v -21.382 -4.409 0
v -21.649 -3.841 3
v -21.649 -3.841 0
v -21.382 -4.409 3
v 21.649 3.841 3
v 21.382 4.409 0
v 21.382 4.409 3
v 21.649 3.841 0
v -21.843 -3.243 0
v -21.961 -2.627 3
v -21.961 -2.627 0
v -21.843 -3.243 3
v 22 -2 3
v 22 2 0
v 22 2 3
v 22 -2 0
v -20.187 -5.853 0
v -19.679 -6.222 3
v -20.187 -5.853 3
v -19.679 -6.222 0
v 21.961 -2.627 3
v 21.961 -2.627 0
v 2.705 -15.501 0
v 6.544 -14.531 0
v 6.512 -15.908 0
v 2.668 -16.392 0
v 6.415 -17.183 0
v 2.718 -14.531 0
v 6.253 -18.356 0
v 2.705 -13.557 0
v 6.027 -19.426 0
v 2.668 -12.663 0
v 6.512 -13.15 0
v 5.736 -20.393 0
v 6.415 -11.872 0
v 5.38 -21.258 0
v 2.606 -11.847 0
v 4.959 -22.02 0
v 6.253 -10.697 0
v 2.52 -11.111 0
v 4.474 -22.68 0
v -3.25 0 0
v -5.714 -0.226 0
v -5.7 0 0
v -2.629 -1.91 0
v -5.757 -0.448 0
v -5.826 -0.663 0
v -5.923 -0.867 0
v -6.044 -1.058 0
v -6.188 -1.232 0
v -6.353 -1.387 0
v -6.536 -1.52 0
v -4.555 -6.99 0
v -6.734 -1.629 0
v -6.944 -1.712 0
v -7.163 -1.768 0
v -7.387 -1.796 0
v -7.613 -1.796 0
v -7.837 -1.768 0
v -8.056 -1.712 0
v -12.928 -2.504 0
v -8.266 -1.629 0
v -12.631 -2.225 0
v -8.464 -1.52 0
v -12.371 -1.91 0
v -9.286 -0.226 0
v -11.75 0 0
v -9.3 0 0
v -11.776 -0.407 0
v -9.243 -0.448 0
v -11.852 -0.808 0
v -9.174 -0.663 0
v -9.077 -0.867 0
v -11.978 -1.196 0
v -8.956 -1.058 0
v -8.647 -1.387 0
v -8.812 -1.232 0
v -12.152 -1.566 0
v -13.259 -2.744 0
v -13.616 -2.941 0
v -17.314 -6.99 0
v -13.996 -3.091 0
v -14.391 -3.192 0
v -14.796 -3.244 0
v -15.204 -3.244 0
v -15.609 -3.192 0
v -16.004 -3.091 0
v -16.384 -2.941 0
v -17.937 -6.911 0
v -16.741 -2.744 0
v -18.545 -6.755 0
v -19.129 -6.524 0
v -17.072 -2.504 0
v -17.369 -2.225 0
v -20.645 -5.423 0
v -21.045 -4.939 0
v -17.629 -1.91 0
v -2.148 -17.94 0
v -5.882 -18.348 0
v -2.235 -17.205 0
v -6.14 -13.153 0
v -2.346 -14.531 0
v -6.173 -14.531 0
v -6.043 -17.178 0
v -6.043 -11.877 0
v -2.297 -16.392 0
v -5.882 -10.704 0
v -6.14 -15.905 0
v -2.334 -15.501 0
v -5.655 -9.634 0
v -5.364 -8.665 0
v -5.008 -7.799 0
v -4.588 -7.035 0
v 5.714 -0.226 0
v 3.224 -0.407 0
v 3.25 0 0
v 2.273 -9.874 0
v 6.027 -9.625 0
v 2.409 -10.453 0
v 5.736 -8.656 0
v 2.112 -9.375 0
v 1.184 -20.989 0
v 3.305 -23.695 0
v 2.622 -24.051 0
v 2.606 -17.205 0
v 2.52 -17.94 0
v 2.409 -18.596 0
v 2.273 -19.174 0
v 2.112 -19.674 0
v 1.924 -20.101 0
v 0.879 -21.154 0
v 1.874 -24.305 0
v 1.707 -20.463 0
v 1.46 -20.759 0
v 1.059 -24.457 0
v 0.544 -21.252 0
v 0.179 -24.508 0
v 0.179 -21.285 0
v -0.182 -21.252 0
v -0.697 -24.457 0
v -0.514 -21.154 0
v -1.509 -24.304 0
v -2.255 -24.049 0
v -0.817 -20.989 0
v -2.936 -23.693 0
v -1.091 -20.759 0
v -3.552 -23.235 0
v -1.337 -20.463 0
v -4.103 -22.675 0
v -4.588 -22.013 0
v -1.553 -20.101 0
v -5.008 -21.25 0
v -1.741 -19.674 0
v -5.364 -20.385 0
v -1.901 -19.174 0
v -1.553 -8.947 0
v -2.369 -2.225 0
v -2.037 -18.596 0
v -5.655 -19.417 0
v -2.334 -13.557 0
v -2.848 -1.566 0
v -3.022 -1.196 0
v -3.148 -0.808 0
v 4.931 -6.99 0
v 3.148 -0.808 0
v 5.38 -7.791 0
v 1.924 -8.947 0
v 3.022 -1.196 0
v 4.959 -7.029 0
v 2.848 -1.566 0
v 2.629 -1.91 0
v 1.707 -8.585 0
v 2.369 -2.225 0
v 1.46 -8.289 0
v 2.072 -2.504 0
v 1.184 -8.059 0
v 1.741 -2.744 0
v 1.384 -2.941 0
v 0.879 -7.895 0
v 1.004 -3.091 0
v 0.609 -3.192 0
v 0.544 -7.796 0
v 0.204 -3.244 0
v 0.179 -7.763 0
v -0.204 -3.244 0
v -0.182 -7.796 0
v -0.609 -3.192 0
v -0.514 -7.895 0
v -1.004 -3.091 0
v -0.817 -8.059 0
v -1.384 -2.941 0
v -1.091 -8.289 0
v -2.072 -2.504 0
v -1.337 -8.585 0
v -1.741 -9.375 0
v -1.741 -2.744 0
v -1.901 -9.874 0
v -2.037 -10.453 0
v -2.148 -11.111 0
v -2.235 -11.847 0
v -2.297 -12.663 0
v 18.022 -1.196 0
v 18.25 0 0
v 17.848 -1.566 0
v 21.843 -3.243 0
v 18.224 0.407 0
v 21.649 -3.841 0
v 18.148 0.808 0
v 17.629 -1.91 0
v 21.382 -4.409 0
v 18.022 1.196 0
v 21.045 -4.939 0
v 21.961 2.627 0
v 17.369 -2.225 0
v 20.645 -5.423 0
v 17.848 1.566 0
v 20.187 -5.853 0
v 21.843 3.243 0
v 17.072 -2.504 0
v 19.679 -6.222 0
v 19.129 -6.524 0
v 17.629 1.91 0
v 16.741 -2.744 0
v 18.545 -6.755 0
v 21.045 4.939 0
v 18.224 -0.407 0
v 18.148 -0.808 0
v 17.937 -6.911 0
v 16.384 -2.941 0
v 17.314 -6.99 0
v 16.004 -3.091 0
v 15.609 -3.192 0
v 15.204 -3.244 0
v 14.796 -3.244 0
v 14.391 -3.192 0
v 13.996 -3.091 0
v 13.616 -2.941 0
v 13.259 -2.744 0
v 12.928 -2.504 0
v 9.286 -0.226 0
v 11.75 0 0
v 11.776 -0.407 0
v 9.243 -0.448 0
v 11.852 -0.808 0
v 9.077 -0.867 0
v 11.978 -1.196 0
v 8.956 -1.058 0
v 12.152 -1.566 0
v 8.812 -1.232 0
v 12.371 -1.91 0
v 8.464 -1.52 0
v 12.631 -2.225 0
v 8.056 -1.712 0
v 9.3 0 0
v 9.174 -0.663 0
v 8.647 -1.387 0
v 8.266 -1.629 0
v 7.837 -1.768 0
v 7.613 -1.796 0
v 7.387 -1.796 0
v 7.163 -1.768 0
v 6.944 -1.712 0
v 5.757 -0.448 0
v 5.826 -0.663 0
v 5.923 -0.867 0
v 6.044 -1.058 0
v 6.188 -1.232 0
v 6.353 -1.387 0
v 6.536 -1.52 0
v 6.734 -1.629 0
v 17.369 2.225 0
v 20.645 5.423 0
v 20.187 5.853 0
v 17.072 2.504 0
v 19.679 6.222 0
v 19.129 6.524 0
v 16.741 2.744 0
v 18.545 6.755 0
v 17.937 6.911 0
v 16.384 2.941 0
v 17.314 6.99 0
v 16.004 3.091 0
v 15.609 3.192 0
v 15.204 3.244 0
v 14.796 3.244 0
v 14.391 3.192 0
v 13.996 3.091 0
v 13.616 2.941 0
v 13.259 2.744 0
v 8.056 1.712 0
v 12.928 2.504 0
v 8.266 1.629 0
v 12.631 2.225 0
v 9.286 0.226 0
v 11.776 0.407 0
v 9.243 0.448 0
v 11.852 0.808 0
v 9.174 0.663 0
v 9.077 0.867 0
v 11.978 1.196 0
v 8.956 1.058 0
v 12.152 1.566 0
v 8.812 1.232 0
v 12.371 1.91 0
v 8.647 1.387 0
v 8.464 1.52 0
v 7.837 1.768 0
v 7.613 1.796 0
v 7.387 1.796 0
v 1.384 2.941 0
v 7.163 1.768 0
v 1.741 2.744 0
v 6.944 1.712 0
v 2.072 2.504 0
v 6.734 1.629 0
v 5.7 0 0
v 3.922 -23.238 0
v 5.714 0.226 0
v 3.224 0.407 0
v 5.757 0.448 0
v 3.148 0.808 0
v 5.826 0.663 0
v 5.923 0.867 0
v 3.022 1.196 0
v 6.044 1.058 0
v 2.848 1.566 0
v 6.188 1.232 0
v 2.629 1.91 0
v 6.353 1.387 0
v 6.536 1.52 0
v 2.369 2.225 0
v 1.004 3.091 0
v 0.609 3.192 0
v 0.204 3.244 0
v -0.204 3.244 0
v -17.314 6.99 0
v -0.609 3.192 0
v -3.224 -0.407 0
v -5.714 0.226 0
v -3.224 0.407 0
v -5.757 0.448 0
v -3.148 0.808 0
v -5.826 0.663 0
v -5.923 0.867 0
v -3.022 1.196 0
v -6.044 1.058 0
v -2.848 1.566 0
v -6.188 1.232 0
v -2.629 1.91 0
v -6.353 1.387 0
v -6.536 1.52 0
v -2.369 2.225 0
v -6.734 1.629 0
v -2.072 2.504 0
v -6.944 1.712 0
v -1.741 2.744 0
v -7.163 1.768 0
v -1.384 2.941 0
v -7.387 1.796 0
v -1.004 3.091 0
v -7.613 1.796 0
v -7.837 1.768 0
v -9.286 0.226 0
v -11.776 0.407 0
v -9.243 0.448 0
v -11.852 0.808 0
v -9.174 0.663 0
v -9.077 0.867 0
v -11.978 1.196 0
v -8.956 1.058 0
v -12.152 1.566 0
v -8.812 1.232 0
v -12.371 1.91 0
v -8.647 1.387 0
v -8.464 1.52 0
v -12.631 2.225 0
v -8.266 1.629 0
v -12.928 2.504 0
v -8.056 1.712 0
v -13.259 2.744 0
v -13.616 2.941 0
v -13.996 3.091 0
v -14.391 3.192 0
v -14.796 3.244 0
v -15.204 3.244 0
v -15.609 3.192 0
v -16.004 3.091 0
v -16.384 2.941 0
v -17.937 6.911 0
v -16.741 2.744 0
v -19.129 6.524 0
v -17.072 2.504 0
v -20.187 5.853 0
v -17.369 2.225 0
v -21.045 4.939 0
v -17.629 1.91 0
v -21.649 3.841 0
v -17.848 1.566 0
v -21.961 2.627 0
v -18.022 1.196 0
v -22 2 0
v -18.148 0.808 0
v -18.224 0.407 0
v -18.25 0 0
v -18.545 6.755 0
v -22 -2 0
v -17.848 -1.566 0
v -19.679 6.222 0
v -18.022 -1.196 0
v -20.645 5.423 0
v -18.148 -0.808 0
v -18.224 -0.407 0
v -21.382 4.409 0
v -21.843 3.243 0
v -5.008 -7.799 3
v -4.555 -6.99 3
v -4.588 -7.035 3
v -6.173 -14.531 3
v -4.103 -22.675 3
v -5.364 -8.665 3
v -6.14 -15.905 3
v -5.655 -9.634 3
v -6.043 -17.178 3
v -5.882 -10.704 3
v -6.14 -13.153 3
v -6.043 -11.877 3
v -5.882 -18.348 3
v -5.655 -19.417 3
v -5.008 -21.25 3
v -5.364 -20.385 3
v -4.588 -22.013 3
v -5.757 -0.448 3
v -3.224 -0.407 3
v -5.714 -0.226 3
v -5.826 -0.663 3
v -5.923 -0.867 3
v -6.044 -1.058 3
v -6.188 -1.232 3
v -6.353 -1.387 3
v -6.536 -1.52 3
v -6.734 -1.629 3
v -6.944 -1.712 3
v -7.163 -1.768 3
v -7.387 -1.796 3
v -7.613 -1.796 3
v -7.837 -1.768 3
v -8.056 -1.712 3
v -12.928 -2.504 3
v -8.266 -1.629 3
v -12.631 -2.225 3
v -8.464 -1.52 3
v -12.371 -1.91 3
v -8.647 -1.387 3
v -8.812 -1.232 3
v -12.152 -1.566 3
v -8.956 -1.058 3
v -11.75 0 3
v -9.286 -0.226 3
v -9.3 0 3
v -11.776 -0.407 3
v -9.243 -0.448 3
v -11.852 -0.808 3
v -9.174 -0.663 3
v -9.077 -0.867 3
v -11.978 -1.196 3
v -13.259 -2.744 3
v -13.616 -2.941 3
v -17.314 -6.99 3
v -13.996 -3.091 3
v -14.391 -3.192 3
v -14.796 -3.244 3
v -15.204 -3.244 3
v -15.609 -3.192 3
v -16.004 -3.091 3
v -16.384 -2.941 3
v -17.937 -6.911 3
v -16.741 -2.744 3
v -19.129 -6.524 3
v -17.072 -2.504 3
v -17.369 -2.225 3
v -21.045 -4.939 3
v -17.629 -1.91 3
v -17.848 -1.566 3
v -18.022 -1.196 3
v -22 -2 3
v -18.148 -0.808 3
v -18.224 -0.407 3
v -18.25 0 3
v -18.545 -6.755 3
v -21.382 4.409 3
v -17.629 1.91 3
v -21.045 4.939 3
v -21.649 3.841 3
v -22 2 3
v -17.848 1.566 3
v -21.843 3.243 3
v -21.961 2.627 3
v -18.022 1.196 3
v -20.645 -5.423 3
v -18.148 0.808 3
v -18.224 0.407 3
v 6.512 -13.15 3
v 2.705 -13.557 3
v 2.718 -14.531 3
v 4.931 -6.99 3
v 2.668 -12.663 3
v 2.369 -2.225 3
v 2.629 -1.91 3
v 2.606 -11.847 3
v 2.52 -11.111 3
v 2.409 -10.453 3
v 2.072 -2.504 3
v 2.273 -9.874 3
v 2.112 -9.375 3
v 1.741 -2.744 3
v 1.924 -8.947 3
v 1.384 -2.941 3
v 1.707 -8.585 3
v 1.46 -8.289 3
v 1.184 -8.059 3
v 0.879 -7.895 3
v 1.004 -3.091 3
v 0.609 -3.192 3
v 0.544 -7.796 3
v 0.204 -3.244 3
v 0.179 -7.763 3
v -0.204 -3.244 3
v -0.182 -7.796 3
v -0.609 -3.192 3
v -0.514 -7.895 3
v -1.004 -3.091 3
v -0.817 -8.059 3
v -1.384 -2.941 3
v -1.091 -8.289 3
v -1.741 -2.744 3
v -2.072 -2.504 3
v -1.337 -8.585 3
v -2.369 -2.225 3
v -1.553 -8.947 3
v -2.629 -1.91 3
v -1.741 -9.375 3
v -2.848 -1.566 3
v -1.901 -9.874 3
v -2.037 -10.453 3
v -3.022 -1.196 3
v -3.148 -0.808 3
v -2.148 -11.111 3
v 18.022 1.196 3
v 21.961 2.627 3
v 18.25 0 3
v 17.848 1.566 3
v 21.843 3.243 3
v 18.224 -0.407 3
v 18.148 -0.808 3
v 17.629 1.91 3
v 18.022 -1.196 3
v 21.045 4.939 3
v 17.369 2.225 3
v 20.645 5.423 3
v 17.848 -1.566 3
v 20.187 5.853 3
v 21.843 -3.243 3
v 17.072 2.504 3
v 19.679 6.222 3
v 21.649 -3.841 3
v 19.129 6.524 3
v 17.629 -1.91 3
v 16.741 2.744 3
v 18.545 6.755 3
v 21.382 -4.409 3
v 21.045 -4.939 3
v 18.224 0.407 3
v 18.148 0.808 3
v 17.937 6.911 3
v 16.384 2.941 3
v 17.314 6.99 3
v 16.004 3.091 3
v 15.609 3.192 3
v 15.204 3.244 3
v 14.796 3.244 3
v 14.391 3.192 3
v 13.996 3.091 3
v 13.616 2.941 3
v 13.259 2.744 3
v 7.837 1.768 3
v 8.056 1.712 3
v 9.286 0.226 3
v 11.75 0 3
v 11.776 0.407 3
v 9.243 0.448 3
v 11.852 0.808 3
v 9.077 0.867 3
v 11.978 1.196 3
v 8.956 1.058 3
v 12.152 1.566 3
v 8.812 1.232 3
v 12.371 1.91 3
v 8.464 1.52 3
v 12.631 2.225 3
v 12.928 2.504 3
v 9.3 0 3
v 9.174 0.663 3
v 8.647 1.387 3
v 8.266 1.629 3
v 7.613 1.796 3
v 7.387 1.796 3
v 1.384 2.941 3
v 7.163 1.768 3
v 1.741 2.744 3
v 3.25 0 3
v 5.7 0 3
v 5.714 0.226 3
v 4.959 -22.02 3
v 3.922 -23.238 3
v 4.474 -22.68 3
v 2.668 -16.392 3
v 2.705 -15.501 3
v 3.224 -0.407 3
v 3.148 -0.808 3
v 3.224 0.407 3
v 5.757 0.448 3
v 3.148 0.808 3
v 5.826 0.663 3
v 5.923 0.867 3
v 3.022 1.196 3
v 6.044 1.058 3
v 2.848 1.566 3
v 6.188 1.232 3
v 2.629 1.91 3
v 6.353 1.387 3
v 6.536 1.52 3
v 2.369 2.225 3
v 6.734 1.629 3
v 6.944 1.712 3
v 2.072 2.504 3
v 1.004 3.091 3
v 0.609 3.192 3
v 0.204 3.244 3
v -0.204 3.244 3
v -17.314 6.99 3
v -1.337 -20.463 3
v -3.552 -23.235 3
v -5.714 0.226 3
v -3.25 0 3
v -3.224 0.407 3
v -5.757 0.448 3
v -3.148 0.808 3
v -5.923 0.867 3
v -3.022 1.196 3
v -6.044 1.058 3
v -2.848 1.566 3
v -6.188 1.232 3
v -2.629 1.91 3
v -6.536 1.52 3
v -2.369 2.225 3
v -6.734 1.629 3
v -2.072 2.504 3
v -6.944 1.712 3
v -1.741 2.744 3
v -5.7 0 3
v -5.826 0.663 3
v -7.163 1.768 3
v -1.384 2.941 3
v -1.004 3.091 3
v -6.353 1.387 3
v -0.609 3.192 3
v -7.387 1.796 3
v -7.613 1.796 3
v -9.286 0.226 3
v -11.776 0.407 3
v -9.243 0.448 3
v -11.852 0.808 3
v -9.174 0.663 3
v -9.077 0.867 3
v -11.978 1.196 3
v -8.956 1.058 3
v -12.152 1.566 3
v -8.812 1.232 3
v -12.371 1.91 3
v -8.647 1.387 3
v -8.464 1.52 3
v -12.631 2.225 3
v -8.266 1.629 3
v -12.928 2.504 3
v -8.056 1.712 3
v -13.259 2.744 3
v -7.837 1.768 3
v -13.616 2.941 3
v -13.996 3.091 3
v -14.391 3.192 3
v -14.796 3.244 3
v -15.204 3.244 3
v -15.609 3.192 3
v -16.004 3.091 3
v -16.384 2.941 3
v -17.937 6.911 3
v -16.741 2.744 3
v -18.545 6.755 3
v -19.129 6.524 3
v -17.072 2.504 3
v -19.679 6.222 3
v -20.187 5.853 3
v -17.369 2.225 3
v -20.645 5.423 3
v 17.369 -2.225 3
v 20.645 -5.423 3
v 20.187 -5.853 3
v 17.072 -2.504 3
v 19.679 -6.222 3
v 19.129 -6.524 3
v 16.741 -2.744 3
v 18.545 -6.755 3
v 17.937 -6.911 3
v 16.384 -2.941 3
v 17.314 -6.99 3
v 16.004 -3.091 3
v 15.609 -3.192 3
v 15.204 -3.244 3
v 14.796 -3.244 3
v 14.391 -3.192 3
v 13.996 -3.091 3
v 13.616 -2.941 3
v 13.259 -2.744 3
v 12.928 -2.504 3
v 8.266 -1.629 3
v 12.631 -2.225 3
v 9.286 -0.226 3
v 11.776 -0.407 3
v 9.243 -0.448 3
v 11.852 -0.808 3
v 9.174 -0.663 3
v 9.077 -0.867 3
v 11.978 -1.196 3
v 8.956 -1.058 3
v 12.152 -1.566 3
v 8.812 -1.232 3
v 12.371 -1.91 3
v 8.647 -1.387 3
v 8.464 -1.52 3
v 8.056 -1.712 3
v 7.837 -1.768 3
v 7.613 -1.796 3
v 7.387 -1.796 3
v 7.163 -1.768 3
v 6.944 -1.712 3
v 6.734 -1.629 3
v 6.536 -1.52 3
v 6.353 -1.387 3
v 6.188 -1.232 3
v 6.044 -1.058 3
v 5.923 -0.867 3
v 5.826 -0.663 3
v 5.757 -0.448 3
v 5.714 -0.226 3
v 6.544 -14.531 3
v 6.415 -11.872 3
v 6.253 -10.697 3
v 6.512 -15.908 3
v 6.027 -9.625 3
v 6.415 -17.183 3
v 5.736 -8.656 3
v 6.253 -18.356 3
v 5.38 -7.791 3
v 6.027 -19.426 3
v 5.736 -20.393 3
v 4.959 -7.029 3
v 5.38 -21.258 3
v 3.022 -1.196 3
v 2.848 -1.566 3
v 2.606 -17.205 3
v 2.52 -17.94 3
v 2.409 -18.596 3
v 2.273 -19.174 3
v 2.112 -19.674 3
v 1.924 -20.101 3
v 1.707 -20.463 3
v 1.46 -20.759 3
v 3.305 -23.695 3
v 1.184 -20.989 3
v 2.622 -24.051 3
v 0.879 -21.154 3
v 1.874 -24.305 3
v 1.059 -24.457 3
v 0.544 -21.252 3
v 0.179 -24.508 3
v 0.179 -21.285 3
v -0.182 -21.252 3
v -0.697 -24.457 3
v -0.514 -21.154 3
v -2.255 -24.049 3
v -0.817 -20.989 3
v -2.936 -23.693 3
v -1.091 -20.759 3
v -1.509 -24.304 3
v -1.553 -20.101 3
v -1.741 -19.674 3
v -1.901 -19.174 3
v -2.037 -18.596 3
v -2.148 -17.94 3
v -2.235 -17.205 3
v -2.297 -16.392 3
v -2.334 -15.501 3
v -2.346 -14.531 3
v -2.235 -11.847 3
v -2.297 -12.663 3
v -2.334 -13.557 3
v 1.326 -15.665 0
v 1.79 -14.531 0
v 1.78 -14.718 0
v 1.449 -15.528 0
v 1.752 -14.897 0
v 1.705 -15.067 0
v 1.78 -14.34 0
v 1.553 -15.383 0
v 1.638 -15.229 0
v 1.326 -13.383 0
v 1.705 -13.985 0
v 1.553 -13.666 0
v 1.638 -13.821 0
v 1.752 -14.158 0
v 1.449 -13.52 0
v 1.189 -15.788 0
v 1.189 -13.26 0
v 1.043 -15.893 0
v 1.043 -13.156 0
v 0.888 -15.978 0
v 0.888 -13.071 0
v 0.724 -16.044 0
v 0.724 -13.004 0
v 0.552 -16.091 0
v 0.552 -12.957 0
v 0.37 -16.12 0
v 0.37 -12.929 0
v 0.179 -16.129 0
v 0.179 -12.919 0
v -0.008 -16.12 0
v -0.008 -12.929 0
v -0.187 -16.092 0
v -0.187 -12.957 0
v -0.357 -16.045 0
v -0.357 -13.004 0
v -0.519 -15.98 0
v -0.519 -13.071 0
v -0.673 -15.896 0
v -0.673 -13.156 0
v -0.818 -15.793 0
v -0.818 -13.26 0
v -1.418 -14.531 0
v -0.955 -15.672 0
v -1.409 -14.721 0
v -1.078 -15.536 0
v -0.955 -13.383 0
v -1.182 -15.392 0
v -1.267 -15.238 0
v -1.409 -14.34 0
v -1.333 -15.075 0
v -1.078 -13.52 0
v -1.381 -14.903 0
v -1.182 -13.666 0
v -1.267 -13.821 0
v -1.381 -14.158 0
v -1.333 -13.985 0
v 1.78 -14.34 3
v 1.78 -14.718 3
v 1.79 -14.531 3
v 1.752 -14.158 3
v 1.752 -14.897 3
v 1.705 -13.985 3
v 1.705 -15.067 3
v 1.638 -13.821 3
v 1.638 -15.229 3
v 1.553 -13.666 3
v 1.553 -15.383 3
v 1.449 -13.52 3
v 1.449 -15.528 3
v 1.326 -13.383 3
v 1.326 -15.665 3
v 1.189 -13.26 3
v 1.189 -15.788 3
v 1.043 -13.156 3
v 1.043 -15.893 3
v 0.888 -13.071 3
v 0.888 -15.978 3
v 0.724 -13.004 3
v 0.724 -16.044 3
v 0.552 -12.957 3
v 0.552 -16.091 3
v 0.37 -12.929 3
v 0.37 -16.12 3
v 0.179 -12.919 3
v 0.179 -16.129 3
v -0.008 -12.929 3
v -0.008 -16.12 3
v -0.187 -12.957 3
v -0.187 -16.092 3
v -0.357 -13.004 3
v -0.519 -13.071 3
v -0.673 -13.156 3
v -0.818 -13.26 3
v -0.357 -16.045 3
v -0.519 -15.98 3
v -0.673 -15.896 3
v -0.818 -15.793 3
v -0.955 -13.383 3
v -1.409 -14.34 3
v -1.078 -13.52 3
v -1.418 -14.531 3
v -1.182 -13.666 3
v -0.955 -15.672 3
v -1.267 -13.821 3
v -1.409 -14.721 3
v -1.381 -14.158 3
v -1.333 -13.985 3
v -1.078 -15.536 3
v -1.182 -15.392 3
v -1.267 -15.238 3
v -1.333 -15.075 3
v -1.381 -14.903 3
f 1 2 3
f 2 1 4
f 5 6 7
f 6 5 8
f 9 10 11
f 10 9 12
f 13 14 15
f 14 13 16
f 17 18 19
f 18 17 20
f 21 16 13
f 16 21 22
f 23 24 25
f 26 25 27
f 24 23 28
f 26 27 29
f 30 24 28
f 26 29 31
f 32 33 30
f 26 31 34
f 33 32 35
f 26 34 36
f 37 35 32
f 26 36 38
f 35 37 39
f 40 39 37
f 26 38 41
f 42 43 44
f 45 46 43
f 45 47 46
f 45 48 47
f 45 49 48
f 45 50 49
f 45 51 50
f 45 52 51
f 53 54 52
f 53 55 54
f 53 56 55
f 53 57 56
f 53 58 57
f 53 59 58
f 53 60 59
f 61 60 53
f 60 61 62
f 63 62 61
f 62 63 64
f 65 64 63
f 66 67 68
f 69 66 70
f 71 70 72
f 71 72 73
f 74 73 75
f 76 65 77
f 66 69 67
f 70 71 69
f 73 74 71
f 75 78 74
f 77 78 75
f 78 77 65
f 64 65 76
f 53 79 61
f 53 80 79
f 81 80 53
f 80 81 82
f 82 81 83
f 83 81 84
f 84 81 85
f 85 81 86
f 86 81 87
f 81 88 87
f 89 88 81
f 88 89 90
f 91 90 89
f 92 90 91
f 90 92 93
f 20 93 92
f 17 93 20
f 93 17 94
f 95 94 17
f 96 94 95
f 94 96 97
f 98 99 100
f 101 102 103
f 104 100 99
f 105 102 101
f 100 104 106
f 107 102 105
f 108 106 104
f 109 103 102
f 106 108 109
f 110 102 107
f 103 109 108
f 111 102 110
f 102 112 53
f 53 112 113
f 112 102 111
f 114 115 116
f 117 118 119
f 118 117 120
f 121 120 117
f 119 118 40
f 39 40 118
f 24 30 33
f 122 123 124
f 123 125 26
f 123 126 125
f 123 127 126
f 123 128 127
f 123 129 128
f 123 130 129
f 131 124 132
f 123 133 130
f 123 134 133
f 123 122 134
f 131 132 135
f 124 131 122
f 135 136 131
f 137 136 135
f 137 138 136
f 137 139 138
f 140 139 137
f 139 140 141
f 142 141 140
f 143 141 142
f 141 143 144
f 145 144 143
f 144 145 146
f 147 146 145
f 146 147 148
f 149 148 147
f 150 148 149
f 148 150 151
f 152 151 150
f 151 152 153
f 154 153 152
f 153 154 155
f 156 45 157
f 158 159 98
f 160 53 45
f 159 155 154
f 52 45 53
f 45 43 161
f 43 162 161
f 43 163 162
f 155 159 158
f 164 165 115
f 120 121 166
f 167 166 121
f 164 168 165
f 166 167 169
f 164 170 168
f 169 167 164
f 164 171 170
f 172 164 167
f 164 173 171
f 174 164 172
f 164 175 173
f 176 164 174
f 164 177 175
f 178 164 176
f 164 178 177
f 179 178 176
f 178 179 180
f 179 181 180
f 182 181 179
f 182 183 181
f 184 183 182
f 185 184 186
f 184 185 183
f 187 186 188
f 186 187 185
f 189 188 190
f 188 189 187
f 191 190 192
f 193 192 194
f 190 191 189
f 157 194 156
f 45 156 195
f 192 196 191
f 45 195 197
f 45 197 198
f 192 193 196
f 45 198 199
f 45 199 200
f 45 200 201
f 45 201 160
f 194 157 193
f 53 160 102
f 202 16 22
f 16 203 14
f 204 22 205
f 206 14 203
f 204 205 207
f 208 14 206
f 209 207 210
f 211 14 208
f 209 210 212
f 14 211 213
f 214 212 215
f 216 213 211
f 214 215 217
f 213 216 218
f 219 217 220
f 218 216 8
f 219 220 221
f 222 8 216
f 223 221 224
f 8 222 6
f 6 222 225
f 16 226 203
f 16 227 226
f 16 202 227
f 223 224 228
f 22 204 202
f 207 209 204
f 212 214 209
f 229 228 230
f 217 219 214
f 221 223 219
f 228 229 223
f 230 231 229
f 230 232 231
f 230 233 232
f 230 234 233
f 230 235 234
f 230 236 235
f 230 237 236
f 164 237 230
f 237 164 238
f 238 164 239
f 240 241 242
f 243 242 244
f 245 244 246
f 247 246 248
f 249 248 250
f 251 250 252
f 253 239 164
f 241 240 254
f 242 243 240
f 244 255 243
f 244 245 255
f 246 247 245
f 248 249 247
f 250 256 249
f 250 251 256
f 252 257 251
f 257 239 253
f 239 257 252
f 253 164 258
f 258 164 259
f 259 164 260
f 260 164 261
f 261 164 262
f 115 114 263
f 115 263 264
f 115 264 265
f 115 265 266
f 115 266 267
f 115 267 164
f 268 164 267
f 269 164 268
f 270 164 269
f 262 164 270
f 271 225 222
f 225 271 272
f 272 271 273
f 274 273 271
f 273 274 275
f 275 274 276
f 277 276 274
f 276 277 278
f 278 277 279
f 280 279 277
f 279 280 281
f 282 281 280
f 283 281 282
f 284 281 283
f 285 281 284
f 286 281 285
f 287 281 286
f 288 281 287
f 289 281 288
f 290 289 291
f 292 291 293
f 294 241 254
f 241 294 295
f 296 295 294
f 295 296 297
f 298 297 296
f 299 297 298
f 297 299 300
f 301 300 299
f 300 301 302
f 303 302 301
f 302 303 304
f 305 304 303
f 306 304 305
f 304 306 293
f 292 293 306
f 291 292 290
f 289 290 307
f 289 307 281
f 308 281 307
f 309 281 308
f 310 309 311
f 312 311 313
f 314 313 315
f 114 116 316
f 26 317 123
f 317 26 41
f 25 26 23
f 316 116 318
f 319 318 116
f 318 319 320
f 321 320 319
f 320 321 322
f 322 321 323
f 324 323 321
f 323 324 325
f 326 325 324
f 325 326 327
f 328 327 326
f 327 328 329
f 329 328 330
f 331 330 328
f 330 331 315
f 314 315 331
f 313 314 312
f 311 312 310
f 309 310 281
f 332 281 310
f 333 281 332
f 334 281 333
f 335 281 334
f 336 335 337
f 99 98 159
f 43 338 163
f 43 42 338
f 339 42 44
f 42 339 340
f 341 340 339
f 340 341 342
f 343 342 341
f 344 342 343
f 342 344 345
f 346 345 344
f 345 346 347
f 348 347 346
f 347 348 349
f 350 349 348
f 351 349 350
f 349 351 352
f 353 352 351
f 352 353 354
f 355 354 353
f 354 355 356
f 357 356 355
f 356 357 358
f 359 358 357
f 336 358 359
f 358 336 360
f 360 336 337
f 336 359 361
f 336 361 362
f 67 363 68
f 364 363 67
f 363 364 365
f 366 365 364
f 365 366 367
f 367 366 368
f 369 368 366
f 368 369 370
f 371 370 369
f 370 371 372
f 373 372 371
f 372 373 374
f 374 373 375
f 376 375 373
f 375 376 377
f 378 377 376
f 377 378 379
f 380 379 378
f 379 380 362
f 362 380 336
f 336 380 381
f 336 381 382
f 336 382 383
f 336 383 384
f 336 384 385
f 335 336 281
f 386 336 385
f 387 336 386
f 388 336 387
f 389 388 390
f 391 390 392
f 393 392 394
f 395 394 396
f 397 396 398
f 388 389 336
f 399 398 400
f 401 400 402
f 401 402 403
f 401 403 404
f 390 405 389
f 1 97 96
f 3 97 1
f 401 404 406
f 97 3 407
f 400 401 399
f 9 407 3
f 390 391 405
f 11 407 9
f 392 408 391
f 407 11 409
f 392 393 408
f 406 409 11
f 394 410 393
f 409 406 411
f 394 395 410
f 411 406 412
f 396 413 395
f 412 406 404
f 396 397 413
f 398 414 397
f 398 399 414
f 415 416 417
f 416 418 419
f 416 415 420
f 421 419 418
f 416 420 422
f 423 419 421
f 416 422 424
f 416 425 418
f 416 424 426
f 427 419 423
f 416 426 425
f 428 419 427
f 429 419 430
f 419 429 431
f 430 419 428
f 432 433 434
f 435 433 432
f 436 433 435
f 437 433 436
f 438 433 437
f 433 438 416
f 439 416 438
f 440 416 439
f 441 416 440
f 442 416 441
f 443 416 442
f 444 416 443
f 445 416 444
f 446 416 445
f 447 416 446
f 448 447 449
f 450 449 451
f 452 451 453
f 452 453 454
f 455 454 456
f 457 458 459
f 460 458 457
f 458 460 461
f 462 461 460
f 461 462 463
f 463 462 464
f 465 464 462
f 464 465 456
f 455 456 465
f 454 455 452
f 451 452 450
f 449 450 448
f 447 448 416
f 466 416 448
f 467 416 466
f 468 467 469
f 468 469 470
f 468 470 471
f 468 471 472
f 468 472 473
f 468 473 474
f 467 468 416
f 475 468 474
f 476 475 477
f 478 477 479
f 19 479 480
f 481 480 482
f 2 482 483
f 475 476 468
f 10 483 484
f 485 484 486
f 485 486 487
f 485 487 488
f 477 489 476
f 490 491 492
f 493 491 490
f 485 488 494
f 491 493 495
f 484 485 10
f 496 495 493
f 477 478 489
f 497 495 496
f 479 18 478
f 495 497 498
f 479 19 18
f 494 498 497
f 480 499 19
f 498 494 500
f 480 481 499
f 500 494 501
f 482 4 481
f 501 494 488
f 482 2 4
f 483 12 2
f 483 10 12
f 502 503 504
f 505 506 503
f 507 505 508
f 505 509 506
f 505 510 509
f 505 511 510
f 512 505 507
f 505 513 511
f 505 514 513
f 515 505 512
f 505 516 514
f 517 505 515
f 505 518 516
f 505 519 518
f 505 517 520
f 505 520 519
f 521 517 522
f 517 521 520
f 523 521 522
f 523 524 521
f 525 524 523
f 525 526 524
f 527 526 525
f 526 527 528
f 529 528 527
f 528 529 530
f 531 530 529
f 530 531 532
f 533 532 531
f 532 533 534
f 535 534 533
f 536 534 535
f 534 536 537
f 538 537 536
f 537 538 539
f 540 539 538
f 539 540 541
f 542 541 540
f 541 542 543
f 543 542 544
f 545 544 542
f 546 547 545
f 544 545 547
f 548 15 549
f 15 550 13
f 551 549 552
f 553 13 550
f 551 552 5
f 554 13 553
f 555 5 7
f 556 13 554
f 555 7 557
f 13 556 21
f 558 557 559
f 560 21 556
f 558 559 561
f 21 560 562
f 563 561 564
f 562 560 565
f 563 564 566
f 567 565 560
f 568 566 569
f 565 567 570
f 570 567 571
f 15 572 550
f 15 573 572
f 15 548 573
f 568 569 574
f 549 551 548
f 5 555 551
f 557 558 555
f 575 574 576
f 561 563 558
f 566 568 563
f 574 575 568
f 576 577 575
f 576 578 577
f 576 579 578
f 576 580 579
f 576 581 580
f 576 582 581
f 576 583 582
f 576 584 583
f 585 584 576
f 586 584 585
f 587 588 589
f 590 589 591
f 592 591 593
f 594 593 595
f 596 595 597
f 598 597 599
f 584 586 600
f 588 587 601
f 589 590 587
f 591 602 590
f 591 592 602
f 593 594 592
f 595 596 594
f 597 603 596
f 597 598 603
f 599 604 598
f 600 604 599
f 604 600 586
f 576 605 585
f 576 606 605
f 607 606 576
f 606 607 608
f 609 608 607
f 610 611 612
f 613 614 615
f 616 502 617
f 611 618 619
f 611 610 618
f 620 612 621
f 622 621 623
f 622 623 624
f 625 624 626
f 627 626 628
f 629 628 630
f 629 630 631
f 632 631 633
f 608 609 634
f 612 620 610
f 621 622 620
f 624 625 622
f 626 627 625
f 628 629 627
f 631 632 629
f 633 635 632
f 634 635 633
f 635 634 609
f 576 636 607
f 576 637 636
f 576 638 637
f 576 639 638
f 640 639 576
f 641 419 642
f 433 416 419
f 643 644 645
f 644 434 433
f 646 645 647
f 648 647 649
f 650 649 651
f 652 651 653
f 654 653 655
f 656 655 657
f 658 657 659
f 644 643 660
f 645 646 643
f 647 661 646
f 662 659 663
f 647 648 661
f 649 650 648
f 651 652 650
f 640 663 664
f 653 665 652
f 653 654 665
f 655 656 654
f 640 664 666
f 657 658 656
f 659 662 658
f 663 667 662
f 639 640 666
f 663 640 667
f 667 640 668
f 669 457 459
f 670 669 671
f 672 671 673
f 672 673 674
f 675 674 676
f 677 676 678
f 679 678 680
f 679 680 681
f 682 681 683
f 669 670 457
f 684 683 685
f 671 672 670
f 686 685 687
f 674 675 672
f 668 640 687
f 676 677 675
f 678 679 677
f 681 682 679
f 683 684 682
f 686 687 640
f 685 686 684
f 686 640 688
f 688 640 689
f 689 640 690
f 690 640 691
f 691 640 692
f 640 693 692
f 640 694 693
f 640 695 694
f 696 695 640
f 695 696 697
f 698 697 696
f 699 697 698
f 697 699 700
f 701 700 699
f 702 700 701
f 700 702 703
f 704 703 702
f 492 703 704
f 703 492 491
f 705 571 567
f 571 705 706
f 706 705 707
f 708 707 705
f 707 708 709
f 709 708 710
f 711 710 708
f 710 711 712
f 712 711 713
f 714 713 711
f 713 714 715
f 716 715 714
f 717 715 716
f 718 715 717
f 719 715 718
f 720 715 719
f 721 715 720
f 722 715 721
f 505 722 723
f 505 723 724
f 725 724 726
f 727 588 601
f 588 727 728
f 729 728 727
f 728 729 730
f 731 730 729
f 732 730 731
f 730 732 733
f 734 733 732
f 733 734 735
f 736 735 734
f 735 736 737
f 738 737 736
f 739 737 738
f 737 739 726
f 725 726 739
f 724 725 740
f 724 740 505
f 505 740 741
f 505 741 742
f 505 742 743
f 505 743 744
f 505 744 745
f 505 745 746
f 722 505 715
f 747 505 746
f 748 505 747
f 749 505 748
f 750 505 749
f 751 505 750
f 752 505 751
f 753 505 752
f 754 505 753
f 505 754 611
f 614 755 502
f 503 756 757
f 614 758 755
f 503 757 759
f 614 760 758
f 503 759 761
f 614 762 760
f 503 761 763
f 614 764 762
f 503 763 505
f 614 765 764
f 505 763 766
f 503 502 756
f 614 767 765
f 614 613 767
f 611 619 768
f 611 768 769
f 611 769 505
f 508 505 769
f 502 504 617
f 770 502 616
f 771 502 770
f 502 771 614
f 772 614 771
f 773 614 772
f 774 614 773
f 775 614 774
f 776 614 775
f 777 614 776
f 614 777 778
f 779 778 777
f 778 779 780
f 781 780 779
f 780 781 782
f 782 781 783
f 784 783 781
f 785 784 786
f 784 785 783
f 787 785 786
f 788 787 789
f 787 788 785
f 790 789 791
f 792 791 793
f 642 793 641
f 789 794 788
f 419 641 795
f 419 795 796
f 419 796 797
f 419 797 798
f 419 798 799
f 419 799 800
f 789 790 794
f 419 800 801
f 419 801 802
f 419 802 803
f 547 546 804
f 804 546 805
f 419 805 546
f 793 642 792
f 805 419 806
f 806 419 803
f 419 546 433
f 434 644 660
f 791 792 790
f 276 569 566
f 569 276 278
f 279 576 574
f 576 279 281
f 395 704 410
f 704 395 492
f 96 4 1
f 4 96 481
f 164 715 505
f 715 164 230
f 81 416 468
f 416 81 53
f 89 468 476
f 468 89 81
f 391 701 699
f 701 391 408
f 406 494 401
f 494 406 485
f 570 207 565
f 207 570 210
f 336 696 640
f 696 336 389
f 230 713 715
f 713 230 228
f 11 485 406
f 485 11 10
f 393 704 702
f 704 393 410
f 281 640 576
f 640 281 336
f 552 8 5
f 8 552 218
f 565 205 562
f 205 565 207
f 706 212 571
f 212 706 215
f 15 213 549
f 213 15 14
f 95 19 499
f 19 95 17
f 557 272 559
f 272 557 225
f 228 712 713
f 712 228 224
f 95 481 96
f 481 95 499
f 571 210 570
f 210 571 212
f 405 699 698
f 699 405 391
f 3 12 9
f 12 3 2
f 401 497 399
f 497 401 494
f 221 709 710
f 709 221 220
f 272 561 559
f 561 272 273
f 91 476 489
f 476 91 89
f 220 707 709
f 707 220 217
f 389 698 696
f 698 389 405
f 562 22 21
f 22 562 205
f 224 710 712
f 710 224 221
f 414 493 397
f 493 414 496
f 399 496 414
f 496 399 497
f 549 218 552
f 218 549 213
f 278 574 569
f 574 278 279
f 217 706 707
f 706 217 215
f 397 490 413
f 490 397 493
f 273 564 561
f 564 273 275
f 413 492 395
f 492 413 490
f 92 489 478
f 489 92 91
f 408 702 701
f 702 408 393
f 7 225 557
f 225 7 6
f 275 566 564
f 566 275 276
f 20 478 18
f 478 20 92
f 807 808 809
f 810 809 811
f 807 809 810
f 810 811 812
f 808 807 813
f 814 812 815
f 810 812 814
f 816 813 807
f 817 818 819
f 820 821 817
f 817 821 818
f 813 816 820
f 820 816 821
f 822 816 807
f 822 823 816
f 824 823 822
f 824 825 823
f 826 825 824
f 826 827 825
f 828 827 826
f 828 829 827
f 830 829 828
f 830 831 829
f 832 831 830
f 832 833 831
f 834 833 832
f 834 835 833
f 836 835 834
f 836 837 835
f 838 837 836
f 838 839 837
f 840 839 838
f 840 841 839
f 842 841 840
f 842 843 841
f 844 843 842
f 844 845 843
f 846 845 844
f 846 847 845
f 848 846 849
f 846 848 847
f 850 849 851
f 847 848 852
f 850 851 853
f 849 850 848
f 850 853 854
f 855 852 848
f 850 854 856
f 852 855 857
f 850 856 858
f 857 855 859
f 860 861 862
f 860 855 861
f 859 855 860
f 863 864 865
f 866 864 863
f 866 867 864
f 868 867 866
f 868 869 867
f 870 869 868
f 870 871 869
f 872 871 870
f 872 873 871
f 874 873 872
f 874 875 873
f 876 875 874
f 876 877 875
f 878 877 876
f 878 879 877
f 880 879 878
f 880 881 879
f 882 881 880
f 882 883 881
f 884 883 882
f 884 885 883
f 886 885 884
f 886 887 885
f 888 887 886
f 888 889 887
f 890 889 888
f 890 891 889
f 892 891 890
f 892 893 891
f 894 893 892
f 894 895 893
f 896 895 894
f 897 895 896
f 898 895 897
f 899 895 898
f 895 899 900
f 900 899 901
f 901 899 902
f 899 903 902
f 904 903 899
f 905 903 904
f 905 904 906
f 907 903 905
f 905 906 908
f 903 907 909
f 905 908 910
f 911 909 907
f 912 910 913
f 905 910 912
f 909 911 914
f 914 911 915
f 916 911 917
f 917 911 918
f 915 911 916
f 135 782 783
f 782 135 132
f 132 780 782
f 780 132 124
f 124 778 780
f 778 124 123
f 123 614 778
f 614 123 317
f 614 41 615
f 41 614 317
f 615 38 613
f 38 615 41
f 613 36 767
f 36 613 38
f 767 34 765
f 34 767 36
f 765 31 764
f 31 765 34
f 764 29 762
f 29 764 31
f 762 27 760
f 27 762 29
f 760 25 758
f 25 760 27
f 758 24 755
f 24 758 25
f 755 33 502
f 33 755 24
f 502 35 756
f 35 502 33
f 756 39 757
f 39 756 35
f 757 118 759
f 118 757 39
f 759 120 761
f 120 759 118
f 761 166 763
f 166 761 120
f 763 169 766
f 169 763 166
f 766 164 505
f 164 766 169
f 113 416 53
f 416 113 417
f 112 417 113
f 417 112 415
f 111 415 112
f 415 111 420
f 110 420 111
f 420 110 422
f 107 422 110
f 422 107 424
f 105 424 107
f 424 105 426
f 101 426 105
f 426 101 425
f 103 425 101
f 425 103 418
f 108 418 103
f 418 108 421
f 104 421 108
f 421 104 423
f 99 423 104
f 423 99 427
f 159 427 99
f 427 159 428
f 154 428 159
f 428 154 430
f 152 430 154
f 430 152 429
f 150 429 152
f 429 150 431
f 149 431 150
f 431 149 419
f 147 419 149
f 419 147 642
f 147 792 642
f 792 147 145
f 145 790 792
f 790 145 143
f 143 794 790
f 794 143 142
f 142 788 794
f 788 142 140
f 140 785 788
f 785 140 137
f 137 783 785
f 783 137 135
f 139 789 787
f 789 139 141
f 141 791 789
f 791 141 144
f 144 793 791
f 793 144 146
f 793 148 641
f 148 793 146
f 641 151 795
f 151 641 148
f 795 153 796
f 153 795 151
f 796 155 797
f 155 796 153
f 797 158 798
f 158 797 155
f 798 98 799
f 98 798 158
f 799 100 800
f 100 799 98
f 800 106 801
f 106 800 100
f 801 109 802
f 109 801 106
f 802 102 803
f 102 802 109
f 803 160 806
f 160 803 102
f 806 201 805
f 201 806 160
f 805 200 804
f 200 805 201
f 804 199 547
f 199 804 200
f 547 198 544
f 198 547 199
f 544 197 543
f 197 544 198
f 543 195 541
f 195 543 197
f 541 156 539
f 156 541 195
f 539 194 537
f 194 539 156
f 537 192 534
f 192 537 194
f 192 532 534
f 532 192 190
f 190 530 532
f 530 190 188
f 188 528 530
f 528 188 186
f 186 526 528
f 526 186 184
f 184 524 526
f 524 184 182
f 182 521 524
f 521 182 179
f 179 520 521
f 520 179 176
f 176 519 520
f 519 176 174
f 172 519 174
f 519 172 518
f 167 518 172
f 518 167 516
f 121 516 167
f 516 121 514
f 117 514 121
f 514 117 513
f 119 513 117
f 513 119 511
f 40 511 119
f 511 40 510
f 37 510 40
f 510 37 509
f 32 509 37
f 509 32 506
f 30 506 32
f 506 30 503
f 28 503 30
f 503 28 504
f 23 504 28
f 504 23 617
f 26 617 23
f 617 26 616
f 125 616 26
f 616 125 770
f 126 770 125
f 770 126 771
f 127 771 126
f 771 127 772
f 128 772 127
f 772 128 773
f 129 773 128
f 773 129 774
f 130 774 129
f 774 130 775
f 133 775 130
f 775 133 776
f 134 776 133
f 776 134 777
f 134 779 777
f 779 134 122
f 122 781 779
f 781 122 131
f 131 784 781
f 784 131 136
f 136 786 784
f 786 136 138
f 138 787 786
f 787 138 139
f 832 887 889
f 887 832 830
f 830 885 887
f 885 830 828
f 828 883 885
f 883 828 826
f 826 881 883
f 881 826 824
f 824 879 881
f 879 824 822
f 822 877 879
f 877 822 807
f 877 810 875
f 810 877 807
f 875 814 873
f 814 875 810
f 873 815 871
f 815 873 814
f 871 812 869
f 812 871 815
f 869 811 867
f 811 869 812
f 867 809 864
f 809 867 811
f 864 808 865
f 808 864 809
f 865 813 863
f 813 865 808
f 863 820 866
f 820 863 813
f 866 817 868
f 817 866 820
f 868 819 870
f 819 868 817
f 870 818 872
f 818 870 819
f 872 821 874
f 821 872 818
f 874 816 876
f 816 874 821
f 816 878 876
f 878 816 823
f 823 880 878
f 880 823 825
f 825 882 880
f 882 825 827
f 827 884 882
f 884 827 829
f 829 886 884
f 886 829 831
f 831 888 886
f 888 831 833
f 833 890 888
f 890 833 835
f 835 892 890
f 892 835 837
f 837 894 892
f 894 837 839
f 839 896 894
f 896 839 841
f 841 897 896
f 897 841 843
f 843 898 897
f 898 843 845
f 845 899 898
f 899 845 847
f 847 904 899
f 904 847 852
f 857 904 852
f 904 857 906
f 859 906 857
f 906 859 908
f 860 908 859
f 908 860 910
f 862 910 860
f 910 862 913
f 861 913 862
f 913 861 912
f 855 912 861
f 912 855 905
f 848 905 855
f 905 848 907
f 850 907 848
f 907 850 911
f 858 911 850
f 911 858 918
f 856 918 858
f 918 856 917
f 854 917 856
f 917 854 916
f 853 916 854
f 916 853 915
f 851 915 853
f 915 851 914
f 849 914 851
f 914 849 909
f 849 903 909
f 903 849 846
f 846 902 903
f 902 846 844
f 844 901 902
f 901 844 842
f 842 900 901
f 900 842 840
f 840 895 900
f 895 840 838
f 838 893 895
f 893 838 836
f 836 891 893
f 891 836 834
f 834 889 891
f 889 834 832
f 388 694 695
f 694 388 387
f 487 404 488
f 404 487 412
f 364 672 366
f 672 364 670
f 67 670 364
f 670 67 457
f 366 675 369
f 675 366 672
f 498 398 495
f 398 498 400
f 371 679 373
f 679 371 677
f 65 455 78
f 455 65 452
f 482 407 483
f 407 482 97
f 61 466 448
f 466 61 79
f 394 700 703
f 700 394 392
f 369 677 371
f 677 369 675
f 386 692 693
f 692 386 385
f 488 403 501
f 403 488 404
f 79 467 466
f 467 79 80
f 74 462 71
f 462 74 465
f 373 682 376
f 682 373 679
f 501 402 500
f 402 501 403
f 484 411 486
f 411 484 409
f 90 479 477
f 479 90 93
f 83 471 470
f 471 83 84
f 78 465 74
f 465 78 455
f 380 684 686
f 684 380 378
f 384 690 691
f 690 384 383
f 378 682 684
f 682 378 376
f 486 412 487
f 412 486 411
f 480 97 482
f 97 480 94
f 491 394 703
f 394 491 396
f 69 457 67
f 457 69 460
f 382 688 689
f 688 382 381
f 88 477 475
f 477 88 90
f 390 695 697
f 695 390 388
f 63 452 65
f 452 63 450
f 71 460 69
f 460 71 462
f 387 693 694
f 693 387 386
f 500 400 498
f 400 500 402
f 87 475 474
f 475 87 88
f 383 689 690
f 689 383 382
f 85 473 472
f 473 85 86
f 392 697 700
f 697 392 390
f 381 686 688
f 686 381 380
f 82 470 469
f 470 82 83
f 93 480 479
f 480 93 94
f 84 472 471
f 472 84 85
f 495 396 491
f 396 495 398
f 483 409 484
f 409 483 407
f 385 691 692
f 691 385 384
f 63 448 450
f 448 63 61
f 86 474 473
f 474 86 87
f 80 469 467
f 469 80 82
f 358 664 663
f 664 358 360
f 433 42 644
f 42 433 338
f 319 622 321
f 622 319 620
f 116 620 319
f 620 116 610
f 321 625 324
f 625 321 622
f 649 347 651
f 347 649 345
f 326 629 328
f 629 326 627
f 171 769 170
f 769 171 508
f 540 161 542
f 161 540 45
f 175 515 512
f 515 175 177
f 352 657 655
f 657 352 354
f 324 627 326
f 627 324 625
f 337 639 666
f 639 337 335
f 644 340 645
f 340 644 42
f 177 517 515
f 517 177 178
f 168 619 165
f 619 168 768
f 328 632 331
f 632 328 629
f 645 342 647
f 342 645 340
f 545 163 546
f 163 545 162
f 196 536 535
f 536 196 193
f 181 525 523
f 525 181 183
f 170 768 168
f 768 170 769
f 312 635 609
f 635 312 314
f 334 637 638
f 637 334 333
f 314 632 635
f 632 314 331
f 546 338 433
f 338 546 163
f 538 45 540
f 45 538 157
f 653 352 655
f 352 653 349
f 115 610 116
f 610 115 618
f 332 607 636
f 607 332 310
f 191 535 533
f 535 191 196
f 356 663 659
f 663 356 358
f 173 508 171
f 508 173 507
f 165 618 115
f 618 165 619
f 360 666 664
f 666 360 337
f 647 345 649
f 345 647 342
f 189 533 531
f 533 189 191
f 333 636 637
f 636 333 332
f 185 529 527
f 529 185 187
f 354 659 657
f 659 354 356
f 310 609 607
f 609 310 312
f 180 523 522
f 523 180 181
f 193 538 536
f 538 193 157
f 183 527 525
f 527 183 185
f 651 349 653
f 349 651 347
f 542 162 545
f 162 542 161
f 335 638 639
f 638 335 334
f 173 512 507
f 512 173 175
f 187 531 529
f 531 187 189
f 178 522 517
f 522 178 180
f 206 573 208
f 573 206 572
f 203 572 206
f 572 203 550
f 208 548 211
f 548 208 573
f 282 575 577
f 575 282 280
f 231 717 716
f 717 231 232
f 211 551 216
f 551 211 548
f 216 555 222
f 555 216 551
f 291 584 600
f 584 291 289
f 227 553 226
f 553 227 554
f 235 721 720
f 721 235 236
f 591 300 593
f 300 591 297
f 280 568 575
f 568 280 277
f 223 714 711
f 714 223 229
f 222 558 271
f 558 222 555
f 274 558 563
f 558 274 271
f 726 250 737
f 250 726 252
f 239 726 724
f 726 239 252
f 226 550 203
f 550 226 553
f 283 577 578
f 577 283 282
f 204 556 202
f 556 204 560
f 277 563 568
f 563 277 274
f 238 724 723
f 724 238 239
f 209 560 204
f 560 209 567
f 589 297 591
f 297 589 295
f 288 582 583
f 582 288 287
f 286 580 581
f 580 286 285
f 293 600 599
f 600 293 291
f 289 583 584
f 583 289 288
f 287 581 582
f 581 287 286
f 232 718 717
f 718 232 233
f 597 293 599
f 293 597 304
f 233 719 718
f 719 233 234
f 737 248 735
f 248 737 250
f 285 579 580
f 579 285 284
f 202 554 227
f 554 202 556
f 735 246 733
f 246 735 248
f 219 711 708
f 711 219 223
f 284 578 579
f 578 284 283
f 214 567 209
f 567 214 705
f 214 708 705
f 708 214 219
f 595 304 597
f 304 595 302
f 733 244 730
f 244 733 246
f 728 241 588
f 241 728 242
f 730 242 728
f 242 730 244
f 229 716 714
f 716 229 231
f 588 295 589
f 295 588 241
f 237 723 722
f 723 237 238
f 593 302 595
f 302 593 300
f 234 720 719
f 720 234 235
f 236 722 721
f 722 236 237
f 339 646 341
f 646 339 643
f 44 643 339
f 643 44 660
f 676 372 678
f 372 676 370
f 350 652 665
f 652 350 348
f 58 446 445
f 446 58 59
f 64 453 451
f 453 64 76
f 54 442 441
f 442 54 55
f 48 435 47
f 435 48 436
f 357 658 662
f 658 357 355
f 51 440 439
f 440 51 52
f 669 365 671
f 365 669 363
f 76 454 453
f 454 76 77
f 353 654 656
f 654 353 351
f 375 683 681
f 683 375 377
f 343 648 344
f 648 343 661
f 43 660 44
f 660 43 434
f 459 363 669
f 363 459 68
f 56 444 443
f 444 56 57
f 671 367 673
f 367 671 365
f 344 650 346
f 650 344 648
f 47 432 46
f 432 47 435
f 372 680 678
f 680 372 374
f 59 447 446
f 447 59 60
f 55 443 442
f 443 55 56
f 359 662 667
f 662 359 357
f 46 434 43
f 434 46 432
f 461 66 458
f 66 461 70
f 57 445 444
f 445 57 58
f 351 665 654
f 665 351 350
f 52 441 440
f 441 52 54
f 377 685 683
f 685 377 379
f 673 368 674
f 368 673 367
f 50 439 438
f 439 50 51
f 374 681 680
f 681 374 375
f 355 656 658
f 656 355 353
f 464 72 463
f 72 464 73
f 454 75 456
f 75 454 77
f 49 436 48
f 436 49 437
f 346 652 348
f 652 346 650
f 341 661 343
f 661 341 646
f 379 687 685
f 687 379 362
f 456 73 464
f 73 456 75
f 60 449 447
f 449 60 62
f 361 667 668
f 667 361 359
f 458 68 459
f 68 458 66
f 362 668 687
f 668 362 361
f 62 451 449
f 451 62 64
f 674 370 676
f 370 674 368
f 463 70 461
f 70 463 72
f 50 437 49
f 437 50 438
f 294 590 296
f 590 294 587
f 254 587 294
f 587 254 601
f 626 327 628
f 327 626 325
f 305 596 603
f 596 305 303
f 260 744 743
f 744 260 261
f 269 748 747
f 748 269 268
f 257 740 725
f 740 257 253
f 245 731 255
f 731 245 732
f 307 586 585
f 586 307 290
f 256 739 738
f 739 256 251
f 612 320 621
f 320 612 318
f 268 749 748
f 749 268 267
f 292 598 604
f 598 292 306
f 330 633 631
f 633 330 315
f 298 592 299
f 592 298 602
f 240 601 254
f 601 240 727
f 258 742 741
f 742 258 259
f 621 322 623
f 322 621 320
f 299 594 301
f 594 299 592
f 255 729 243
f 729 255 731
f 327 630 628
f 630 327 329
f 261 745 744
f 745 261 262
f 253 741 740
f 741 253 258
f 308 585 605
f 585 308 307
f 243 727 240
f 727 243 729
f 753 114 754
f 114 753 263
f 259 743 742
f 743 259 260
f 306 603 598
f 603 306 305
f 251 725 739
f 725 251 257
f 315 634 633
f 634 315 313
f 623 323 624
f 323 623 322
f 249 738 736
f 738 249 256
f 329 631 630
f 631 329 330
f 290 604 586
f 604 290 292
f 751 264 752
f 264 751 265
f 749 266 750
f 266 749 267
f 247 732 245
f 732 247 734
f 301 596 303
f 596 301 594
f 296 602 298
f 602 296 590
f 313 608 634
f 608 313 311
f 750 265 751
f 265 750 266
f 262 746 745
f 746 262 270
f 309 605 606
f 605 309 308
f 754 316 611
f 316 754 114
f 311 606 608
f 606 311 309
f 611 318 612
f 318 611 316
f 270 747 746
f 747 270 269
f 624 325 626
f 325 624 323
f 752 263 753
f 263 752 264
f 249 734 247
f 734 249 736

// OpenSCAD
$fn = 50;


difference() {
	union() {
		hull() {
			translate(v = [-17.0000000000, 2.0000000000, 0]) {
				cylinder(h = 3, r = 5);
			}
			translate(v = [17.0000000000, 2.0000000000, 0]) {
				cylinder(h = 3, r = 5);
			}
			translate(v = [-17.0000000000, -2.0000000000, 0]) {
				cylinder(h = 3, r = 5);
			}
			translate(v = [17.0000000000, -2.0000000000, 0]) {
				cylinder(h = 3, r = 5);
			}
		}
		translate(v = [0, -5, 0]) {
			linear_extrude(height = 3) {
				text(font = "DejaVu Sans Mono:style=Bold", halign = "center", size = 19.0000000000, text = "0", valign = "top");
			}
		}
	}
	union() {
		translate(v = [-15.0000000000, 0.0000000000, 0]) {
			translate(v = [0, 0, -100]) {
				cylinder(h = 200, r = 3.2500000000);
			}
		}
		translate(v = [0, 0, -100]) {
			cylinder(h = 200, r = 3.2500000000);
		}
		translate(v = [15.0000000000, 0.0000000000, 0]) {
			translate(v = [0, 0, -100]) {
				cylinder(h = 200, r = 3.2500000000);
			}
		}
		translate(v = [-15.0000000000, 0.0000000000, 0]) {
			translate(v = [0, 0, -100]) {
				cylinder(h = 200, r = 1.8000000000);
			}
		}
		translate(v = [-7.5000000000, 0.0000000000, 0]) {
			translate(v = [0, 0, -100]) {
				cylinder(h = 200, r = 1.8000000000);
			}
		}
		translate(v = [0, 0, -100]) {
			cylinder(h = 200, r = 1.8000000000);
		}
		translate(v = [7.5000000000, 0.0000000000, 0]) {
			translate(v = [0, 0, -100]) {
				cylinder(h = 200, r = 1.8000000000);
			}
		}
		translate(v = [15.0000000000, 0.0000000000, 0]) {
			translate(v = [0, 0, -100]) {
				cylinder(h = 200, r = 1.8000000000);
			}
		}
	}
}
